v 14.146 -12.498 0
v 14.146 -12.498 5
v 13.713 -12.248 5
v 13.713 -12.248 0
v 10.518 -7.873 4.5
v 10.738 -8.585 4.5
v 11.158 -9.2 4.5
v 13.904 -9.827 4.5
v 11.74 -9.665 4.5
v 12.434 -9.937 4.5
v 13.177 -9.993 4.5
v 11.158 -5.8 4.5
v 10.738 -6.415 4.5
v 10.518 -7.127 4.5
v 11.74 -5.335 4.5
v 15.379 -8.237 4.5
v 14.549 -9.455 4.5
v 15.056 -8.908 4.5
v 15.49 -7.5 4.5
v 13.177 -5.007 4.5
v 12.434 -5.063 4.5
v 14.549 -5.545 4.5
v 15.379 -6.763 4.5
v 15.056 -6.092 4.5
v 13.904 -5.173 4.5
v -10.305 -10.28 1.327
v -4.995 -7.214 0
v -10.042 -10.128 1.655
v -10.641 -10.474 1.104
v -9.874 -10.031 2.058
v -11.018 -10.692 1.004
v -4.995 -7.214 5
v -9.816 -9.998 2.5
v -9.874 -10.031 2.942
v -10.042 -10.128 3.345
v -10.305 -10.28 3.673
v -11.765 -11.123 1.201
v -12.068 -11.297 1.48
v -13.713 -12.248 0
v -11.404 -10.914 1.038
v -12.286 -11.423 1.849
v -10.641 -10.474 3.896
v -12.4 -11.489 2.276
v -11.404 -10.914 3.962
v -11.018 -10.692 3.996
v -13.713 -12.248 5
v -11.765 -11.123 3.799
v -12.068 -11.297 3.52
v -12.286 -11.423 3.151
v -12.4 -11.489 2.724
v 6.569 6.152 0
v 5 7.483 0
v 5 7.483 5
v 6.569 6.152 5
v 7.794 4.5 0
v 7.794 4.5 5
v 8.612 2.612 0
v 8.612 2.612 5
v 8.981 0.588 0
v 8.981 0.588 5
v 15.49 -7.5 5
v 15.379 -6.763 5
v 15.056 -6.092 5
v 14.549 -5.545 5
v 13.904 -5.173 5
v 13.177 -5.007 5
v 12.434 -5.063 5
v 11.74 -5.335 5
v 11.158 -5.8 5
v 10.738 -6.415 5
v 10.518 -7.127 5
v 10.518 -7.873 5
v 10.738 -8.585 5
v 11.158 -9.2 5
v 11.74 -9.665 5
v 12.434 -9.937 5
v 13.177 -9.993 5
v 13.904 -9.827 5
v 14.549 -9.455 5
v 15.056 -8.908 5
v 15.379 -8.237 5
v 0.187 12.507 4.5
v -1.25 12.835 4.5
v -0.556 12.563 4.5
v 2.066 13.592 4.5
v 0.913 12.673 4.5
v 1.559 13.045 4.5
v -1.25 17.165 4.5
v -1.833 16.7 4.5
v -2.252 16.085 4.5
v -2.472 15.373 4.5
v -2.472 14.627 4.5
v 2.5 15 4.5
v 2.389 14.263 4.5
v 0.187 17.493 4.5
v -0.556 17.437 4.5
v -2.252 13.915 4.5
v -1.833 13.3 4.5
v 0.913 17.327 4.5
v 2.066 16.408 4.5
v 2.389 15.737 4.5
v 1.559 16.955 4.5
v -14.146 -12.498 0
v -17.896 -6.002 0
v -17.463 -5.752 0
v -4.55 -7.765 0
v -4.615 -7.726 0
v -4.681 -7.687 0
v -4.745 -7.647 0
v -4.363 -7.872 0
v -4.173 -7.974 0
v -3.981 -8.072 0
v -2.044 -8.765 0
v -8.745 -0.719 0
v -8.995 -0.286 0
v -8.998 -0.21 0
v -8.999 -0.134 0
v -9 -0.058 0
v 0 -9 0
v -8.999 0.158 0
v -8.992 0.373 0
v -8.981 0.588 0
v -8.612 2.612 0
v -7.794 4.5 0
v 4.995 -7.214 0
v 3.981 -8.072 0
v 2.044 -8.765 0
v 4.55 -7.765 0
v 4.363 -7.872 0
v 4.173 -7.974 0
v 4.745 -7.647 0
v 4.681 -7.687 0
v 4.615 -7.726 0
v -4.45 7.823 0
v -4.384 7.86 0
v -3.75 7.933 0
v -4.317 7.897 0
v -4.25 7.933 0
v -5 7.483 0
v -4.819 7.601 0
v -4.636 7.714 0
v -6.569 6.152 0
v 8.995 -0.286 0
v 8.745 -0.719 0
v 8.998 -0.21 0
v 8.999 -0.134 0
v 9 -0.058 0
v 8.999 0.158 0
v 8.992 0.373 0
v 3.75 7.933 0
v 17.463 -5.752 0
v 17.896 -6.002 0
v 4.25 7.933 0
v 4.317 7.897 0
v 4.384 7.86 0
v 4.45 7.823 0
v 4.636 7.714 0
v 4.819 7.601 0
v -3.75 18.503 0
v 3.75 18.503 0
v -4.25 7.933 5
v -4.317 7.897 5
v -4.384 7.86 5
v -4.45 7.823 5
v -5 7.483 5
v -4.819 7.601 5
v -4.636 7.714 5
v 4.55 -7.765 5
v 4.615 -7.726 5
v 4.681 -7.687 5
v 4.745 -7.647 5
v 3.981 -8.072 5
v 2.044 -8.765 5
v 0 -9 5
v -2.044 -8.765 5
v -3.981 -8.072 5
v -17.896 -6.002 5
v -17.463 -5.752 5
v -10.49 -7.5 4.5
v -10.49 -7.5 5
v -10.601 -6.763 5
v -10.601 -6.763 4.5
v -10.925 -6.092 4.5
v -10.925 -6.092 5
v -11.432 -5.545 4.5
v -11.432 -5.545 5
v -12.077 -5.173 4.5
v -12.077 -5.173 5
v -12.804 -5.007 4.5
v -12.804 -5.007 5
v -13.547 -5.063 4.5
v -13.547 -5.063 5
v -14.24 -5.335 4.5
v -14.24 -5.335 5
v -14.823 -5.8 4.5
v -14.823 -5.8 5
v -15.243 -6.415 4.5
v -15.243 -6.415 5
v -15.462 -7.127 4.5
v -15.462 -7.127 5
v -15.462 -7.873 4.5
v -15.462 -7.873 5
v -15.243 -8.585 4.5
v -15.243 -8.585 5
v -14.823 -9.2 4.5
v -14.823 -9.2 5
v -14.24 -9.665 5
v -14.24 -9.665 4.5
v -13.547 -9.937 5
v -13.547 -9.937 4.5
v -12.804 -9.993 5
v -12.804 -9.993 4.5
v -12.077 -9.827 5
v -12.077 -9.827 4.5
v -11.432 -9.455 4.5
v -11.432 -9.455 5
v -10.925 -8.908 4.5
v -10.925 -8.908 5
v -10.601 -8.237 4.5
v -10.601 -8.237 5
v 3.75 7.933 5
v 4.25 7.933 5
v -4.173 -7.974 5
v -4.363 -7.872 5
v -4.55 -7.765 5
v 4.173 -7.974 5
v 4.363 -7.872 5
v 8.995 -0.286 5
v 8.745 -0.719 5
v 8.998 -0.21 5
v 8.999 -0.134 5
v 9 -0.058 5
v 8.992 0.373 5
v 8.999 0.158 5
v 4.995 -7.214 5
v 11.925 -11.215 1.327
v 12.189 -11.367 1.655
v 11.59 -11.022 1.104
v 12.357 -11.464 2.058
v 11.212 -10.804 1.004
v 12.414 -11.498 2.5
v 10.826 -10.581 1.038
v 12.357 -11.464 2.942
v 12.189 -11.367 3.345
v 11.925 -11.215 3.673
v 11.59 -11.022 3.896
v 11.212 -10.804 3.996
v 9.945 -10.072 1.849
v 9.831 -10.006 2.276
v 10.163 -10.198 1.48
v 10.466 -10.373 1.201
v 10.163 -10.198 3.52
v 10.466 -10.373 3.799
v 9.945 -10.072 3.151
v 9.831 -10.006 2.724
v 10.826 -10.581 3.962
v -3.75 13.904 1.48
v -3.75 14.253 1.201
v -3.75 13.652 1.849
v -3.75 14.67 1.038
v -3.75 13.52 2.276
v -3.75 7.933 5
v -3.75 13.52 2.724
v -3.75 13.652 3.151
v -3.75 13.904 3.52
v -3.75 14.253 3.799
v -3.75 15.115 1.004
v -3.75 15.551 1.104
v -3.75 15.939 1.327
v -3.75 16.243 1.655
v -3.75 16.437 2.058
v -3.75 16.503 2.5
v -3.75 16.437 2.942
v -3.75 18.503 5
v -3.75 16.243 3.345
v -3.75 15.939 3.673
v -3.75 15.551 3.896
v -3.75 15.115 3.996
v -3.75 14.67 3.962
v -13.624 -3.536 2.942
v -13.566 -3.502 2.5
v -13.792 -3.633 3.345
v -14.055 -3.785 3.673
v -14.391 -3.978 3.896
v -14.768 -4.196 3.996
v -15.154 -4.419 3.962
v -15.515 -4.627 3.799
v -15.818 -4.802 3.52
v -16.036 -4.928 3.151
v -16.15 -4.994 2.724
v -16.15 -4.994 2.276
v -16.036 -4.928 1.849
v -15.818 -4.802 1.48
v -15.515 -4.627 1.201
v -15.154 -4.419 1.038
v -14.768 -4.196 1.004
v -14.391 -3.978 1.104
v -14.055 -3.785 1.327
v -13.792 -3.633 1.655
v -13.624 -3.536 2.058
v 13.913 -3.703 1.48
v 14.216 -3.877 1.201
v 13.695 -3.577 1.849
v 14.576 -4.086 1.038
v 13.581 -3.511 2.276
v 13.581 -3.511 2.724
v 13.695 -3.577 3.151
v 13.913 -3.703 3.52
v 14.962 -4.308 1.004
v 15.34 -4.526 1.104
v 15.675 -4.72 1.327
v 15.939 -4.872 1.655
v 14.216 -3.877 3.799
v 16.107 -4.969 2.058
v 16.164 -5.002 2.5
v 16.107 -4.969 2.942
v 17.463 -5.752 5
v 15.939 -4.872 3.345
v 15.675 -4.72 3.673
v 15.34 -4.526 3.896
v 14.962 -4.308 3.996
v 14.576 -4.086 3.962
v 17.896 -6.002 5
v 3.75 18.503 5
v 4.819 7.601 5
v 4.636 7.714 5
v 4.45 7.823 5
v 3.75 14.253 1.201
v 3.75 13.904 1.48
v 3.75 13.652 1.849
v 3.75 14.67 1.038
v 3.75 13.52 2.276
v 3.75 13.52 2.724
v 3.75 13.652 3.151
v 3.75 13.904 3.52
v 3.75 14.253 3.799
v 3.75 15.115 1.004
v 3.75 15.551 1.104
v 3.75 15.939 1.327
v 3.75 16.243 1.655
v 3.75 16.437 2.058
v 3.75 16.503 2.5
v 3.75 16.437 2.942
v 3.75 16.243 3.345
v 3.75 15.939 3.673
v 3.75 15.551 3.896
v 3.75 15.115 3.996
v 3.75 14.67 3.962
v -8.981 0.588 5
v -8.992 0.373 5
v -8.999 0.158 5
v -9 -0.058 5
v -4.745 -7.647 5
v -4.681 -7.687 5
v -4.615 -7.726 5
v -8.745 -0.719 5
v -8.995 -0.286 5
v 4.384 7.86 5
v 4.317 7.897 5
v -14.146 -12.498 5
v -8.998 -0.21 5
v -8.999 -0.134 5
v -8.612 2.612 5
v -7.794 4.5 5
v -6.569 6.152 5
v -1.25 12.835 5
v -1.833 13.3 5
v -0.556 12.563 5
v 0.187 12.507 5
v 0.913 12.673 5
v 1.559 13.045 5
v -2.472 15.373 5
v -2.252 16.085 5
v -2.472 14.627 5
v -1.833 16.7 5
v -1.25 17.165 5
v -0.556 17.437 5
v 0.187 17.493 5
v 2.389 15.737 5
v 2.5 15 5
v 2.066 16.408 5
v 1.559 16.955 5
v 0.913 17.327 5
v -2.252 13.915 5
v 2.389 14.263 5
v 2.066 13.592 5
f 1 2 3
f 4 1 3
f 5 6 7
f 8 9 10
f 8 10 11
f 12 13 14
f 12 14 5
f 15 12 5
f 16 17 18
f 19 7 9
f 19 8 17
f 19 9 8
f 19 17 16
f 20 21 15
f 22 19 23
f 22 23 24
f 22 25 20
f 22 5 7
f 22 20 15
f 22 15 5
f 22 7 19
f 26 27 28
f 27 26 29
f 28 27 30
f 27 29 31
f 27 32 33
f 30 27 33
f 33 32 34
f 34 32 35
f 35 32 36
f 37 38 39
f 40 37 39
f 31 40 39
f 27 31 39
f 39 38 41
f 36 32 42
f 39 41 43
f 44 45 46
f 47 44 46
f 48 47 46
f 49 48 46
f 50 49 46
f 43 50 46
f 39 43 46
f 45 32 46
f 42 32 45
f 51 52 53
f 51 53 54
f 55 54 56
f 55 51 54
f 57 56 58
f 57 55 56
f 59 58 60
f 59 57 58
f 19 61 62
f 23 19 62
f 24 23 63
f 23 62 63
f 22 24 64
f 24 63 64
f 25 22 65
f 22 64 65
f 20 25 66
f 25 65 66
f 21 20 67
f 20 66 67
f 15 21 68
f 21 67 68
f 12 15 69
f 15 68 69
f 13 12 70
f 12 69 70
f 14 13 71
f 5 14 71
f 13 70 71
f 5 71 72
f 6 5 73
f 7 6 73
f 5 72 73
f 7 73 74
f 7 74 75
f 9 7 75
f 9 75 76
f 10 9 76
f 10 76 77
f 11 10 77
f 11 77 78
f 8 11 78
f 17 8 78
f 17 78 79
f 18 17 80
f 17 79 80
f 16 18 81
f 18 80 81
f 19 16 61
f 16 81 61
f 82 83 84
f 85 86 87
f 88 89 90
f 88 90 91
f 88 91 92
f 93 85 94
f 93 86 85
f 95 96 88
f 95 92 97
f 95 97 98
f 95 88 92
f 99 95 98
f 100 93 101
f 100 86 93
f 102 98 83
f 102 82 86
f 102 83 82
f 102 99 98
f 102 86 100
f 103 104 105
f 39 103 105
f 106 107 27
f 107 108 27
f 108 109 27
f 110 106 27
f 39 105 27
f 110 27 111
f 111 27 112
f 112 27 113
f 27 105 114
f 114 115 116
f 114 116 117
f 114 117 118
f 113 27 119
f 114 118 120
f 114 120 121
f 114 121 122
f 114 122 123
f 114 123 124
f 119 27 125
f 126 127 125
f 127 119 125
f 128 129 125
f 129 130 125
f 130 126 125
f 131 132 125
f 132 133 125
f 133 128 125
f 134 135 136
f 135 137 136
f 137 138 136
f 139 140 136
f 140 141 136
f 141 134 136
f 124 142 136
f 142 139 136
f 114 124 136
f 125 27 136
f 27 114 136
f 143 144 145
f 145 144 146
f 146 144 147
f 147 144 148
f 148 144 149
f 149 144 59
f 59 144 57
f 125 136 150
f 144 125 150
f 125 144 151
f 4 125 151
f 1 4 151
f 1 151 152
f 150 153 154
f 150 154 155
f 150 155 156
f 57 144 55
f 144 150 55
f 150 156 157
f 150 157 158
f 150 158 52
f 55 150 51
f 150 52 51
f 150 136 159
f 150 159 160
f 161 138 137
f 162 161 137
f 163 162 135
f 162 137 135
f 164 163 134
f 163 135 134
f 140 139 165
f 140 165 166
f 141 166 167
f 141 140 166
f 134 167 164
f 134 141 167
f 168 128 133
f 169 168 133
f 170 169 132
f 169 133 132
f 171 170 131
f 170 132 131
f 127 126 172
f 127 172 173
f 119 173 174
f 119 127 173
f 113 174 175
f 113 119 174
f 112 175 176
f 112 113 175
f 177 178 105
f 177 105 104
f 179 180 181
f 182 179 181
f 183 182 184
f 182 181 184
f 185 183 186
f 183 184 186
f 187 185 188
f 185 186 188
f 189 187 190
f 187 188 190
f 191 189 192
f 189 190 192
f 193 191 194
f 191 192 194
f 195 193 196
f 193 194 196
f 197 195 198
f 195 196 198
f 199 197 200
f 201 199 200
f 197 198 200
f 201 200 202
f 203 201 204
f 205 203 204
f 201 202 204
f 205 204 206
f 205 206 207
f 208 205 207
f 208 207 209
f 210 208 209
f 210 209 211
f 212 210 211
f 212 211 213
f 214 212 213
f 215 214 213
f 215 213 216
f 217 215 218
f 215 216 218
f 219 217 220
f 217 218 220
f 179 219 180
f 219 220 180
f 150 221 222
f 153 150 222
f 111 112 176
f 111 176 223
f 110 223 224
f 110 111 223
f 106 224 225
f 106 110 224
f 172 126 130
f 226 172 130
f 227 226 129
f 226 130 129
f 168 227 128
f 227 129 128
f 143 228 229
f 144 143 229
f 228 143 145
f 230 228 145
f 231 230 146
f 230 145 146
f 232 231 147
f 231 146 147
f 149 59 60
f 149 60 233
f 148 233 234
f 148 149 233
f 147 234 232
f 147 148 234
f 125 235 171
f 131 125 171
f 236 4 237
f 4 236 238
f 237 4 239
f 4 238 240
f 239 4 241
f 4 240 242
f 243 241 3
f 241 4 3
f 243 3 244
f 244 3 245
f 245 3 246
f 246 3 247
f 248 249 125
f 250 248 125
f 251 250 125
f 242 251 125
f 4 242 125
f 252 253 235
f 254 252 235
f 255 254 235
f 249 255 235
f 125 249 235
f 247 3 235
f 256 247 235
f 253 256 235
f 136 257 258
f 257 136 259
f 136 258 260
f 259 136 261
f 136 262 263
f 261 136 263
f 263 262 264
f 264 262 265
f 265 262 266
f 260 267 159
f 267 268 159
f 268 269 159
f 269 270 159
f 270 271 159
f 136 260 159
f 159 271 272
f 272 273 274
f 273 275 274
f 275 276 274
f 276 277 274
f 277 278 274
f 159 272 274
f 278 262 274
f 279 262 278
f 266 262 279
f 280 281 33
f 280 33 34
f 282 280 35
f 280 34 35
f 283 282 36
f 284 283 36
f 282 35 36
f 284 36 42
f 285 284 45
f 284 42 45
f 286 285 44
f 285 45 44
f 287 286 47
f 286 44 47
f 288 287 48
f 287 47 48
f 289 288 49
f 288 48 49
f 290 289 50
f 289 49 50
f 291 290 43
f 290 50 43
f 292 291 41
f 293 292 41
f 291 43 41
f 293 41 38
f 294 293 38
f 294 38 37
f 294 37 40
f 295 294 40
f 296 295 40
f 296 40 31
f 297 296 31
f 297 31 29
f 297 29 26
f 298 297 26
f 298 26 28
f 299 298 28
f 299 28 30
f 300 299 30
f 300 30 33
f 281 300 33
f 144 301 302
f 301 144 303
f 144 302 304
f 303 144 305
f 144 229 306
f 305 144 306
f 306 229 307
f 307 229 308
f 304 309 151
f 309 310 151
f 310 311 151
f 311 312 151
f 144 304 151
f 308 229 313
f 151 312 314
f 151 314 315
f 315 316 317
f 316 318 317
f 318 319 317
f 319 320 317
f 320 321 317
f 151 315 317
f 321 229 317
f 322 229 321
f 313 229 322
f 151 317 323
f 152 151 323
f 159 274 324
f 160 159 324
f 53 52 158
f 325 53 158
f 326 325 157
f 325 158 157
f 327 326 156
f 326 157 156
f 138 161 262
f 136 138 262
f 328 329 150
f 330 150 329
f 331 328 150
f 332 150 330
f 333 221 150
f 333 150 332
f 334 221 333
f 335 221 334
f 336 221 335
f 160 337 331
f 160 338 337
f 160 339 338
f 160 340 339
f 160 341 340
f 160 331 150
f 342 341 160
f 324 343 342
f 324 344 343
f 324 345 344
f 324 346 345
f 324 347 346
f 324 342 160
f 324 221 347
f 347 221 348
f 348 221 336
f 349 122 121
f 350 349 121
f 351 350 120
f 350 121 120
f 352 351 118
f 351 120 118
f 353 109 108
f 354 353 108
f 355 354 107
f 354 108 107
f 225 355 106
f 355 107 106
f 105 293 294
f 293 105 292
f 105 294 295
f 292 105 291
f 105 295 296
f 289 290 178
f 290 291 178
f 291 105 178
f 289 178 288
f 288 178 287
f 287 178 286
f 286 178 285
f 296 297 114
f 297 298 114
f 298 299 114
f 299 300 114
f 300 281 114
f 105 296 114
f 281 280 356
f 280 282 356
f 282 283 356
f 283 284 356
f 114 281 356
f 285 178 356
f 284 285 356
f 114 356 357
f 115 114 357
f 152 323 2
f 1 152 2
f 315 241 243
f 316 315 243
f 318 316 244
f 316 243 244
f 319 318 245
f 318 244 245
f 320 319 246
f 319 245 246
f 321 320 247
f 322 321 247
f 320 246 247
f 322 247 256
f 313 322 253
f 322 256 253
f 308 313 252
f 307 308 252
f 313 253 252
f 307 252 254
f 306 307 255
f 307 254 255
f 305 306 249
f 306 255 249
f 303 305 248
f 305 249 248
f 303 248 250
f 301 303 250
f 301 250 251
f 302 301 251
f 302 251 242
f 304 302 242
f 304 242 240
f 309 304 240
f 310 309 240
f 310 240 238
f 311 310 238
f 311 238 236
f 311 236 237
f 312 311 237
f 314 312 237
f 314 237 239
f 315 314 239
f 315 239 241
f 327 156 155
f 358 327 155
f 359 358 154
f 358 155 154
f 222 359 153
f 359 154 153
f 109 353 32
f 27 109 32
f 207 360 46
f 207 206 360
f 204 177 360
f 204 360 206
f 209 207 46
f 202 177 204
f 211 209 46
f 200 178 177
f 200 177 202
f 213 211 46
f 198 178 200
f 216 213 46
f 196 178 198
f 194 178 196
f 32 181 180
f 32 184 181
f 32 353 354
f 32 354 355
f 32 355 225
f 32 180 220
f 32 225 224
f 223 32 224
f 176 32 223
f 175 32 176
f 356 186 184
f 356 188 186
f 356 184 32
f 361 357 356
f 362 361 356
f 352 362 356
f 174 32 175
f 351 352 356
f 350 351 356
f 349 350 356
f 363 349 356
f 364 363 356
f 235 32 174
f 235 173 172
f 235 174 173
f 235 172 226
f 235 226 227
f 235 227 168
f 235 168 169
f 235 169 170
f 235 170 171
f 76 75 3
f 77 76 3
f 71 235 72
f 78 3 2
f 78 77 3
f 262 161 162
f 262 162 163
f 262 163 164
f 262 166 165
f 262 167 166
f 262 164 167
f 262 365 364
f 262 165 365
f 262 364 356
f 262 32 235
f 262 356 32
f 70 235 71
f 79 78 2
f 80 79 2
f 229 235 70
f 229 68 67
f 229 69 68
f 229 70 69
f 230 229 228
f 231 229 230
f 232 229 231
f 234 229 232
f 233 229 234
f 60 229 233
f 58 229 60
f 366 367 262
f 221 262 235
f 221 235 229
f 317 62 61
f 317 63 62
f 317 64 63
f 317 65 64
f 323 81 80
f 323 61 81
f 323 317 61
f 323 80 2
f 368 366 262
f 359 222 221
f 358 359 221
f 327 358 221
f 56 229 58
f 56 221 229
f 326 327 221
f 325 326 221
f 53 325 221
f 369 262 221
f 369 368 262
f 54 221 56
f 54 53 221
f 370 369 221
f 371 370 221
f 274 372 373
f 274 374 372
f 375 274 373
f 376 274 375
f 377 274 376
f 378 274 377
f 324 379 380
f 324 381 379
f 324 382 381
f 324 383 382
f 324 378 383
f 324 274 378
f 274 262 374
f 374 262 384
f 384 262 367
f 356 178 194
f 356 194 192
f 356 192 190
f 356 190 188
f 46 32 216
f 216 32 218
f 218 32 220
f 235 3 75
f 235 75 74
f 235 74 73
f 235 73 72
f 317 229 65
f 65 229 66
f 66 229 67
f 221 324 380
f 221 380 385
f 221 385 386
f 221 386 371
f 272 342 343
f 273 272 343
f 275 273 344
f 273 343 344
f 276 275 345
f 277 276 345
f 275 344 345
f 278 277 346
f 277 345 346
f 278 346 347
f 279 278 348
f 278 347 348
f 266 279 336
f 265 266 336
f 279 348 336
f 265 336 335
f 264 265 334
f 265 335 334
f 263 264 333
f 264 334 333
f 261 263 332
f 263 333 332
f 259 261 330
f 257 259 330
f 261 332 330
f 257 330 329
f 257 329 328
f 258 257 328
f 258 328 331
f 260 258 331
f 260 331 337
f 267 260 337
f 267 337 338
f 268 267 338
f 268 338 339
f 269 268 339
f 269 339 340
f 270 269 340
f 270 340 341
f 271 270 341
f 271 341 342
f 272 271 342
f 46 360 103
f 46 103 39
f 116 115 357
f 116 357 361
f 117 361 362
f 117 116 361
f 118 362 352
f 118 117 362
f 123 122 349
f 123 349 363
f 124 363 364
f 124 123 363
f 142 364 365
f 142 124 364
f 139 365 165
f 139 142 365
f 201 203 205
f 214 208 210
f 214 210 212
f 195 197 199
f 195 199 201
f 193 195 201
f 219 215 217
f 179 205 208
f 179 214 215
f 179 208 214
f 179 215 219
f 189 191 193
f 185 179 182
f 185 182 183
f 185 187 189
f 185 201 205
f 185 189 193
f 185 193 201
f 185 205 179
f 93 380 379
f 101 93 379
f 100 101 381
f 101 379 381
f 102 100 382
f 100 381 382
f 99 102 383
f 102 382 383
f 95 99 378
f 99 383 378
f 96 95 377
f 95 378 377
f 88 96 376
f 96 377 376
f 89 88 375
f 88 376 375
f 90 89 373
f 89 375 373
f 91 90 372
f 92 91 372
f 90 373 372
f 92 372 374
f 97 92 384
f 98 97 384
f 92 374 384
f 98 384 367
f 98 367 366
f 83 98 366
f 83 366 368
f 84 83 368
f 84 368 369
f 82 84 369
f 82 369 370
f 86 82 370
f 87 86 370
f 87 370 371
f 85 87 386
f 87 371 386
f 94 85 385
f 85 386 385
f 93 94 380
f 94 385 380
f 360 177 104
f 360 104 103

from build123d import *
from build123d.topology import SkipClean

# Parameters (mm, degrees)
EXTRUDE_1_DEPTH      = 5
SKETCH_2_R           = 1.5
CUT_EXTRUDE_1_DEPTH  = 10
SKETCH_3_R           = 1.5
CUT_EXTRUDE_2_DEPTH  = 10
SKETCH_4_R           = 1.5
CUT_EXTRUDE_3_DEPTH  = 10
CUT_EXTRUDE_4_DEPTH  = 3
SKETCH_6_R           = 2.5
CUT_EXTRUDE_5_DEPTH  = 5
CUT_EXTRUDE_START    = -10
CUT_EXTRUDE_6_DEPTH  = 10
SKETCH_9_R           = 2.9
CUT_EXTRUDE_7_DEPTH  = 10
CUT_EXTRUDE_8_DEPTH  = 10
SKETCH_12_R          = 2.5
CUT_EXTRUDE_10_DEPTH = 0.5
SKETCH_13_R          = 5.742346741
EXTRUDE_2_DEPTH      = 5
SKETCH_14_W          = 0.5
SKETCH_14_H          = 10.069998948
CUT_EXTRUDE_11_DEPTH = 5
SKETCH_16_W          = 7.5
SKETCH_16_H          = 0.5
EXTRUDE_3_DEPTH      = 5


with BuildPart() as part:
    # 草图1 → 凸台-拉伸1 (new body)
    with BuildSketch(Plane.XY):
        with BuildLine():
            Line((8.980740698, 0.588469632), (18.088457268, -4.669872981))
            Line((18.088457268, -4.669872981), (13.088457268, -13.330127019))
            Line((13.088457268, -13.330127019), (3.980740698, -8.071784406))
            ThreePointArc((3.980740698, -8.071784406), (0, -9), (-3.980740698, -8.071784406))
            Line((-3.980740698, -8.071784406), (-13.088457268, -13.330127019))
            Line((-13.088457268, -13.330127019), (-18.088457268, -4.669872981))
            Line((-18.088457268, -4.669872981), (-8.980740698, 0.588469632))
            ThreePointArc((-8.980740698, 0.588469632), (-7.794228634, 4.5), (-5, 7.483314774))
            Line((-5, 7.483314774), (-5, 18.003314774))
            Line((-5, 18.003314774), (5, 18.003314774))
            Line((5, 18.003314774), (5, 7.483314774))
            ThreePointArc((5, 7.483314774), (7.794228634, 4.5), (8.980740698, 0.588469632))
        make_face()
    extrude(amount=EXTRUDE_1_DEPTH)

    # 草图2 → 切除-拉伸1 (cut)
    with BuildSketch(Plane(origin=(5, 0, 0), x_dir=(0, 0, -1), z_dir=(1, 0, 0))):
        with Locations(Location((-2.5, 15.003314774, 0), (0, 0, 90))):
            Circle(SKETCH_2_R)
    extrude(amount=-CUT_EXTRUDE_1_DEPTH, mode=Mode.SUBTRACT)

    # 草图3 → 切除-拉伸2 (cut)
    with BuildSketch(Plane(origin=(-2.5, -4.330127019, 0), x_dir=(0.8660254037844364, -0.5000000000000041, 0), z_dir=(-0.500000000000004, -0.8660254037844363, 0))):
        with Locations((15, 2.5)):
            Circle(SKETCH_3_R)
    extrude(amount=-CUT_EXTRUDE_2_DEPTH, mode=Mode.SUBTRACT)

    # 草图4 → 切除-拉伸3 (cut)
    with BuildSketch(Plane(origin=(2.5, -4.330127019, 0), x_dir=(0.8660254037844434, 0.49999999999999184, 0), z_dir=(0.49999999999999184, -0.8660254037844434, 0))):
        with Locations((-15, 2.5)):
            Circle(SKETCH_4_R)
    extrude(amount=-CUT_EXTRUDE_3_DEPTH, mode=Mode.SUBTRACT)

    # 草图5 → 切除-拉伸4 (cut)
    with BuildSketch(Plane.XY.offset(5)):
        Polygon((-4, 0), (-2, -3.464101615), (2, -3.464101615), (4, 0), (2, 3.464101615), (-2, 3.464101615), align=None)
    extrude(amount=-CUT_EXTRUDE_4_DEPTH, mode=Mode.SUBTRACT)

    # 草图6 → 切除-拉伸5 (cut)
    with BuildSketch(Plane.XY.offset(5)):
        Circle(SKETCH_6_R)
    extrude(amount=-CUT_EXTRUDE_5_DEPTH, mode=Mode.SUBTRACT)

    # 草图8 → 切除-拉伸6 (cut)
    with SkipClean():  # the faces are left unmerged after this step: merging them gives an invalid solid
        with BuildSketch(Plane.XY.offset(5).offset(CUT_EXTRUDE_START)):
            with BuildLine():
                Line((-8.999815496, -0.057628503), (-17.813457268, -5.146186953))
                Line((-17.813457268, -5.146186953), (-18.088457268, -4.669872981))
                Line((-18.088457268, -4.669872981), (-8.980740698, 0.588469632))
                ThreePointArc((-8.980740698, 0.588469632), (-8.996080311, 0.265591864), (-8.999815496, -0.057628503))
            make_face()
            with BuildLine():
                Line((-4.549815496, -7.765254597), (-13.363457268, -12.853813047))
                Line((-13.363457268, -12.853813047), (-13.088457268, -13.330127019))
                Line((-13.088457268, -13.330127019), (-3.980740698, -8.071784406))
                ThreePointArc((-3.980740698, -8.071784406), (-4.268030855, -7.923630016), (-4.549815496, -7.765254597))
            make_face()
            with BuildLine():
                Line((-4.45, 7.8228831), (-4.45, 18.003314774))
                Line((-4.45, 18.003314774), (-5, 18.003314774))
                Line((-5, 18.003314774), (-5, 7.483314774))
                ThreePointArc((-5, 7.483314774), (-4.728049456, 7.658038152), (-4.45, 7.8228831))
            make_face()
            with BuildLine():
                Line((4.45, 7.8228831), (4.45, 18.003314774))
                Line((4.45, 18.003314774), (5, 18.003314774))
                Line((5, 18.003314774), (5, 7.483314774))
                ThreePointArc((5, 7.483314774), (4.728049456, 7.658038152), (4.45, 7.8228831))
            make_face()
            with BuildLine():
                Line((4.549815496, -7.765254597), (13.363457268, -12.853813047))
                Line((13.363457268, -12.853813047), (13.088457268, -13.330127019))
                Line((13.088457268, -13.330127019), (3.980740698, -8.071784406))
                ThreePointArc((3.980740698, -8.071784406), (4.268030855, -7.923630016), (4.549815496, -7.765254597))
            make_face()
            with BuildLine():
                Line((8.999815496, -0.057628503), (17.813457268, -5.146186953))
                Line((17.813457268, -5.146186953), (18.088457268, -4.669872981))
                Line((18.088457268, -4.669872981), (8.980740698, 0.588469632))
                ThreePointArc((8.980740698, 0.588469632), (8.996080311, 0.265591864), (8.999815496, -0.057628503))
            make_face()
        extrude(amount=CUT_EXTRUDE_6_DEPTH, mode=Mode.SUBTRACT)

    # 草图9 → 切除-拉伸7 (cut)
    with SkipClean():  # the faces are left unmerged after this step: merging them gives an invalid solid
        with BuildSketch(Plane(origin=(0, 0, 0), x_dir=(-1, 0, 0), z_dir=(0, 0, -1))):
            Circle(SKETCH_9_R)
        extrude(amount=-CUT_EXTRUDE_7_DEPTH, mode=Mode.SUBTRACT)

    # 草图11 → 切除-拉伸8 (cut)
    with BuildSketch(Plane.XY.offset(5).offset(CUT_EXTRUDE_START)):
        with BuildLine():
            Line((17.813457268, -5.146186953), (17.713457268, -5.319392034))
            Line((17.713457268, -5.319392034), (8.995453042, -0.286049947))
            ThreePointArc((8.995453042, -0.286049947), (8.998359102, -0.171853068), (8.999815496, -0.057628503))
            Line((8.999815496, -0.057628503), (17.813457268, -5.146186953))
        make_face()
        with BuildLine():
            Line((-4.45, 18.003314774), (-4.25, 18.003314774))
            Line((-4.25, 18.003314774), (-4.25, 7.933315826))
            ThreePointArc((-4.25, 7.933315826), (-4.350350428, 7.878734109), (-4.45, 7.8228831))
            Line((-4.45, 7.8228831), (-4.45, 18.003314774))
        make_face()
        with BuildLine():
            Line((4.45, 18.003314774), (4.45, 7.8228831))
            ThreePointArc((4.45, 7.8228831), (4.350350428, 7.878734109), (4.25, 7.933315826))
            Line((4.25, 7.933315826), (4.25, 18.003314774))
            Line((4.25, 18.003314774), (4.45, 18.003314774))
        make_face()
        with BuildLine():
            Line((13.363457268, -12.853813047), (4.549815496, -7.765254597))
            ThreePointArc((4.549815496, -7.765254597), (4.648008674, -7.70688104), (4.745453042, -7.647265879))
            Line((4.745453042, -7.647265879), (13.463457268, -12.680607966))
            Line((13.463457268, -12.680607966), (13.363457268, -12.853813047))
        make_face()
        with BuildLine():
            Line((-4.549815496, -7.765254597), (-13.363457268, -12.853813047))
            Line((-13.363457268, -12.853813047), (-13.463457268, -12.680607966))
            Line((-13.463457268, -12.680607966), (-4.745453042, -7.647265879))
            ThreePointArc((-4.745453042, -7.647265879), (-4.648008674, -7.70688104), (-4.549815496, -7.765254597))
        make_face()
        with BuildLine():
            Line((-17.813457268, -5.146186953), (-17.713457268, -5.319392034))
            Line((-17.713457268, -5.319392034), (-8.995453042, -0.286049947))
            ThreePointArc((-8.995453042, -0.286049947), (-8.998359102, -0.171853068), (-8.999815496, -0.057628503))
            Line((-8.999815496, -0.057628503), (-17.813457268, -5.146186953))
        make_face()
    extrude(amount=CUT_EXTRUDE_8_DEPTH, mode=Mode.SUBTRACT)

    # 草图12 → 切除-拉伸10 (cut)
    with BuildSketch(Plane.XY.offset(5)):
        with Locations((0, 15)):
            Circle(SKETCH_12_R)
        with Locations((12.990381057, -7.5)):
            Circle(SKETCH_12_R)
        with Locations((-12.990381057, -7.5)):
            Circle(SKETCH_12_R)
    extrude(amount=-CUT_EXTRUDE_10_DEPTH, mode=Mode.SUBTRACT)

    # 草图13 → 凸台-拉伸2 (add)
    with BuildSketch(Plane.XY.offset(5)):
        Circle(SKETCH_13_R)
    extrude(amount=-EXTRUDE_2_DEPTH)

    # 草图14 → 切除-拉伸11 (cut)
    with BuildSketch(Plane.XY.offset(5)):
        with Locations((-4, 12.9683153)):
            Rectangle(SKETCH_14_W, SKETCH_14_H)
        with Locations((4, 12.9683153)):
            Rectangle(SKETCH_14_W, SKETCH_14_H)
        Polygon((-17.463457268, -5.752404736), (-8.745453042, -0.719062649), (-8.995453042, -0.286049947), (-17.713457268, -5.319392034), align=None)
        Polygon((-4.995453042, -7.214253177), (-13.713457268, -12.247595264), (-13.463457268, -12.680607966), (-4.745453042, -7.647265879), align=None)
        Polygon((13.713457268, -12.247595264), (4.995453042, -7.214253177), (4.745453042, -7.647265879), (13.463457268, -12.680607966), align=None)
        Polygon((8.745453042, -0.719062649), (17.463457268, -5.752404736), (17.713457268, -5.319392034), (8.995453042, -0.286049947), align=None)
    extrude(amount=-CUT_EXTRUDE_11_DEPTH, mode=Mode.SUBTRACT)

    # 草图16 → 凸台-拉伸3 (add)
    with BuildSketch(Plane.XY.offset(5)):
        with Locations((0, 18.253314774)):
            Rectangle(SKETCH_16_W, SKETCH_16_H)
        Polygon((-17.89646997, -6.002404736), (-14.14646997, -12.497595264), (-13.713457268, -12.247595264), (-17.463457268, -5.752404736), align=None)
        Polygon((17.89646997, -6.002404736), (14.14646997, -12.497595264), (13.713457268, -12.247595264), (17.463457268, -5.752404736), align=None)
    extrude(amount=-EXTRUDE_3_DEPTH)


solid = part.part
